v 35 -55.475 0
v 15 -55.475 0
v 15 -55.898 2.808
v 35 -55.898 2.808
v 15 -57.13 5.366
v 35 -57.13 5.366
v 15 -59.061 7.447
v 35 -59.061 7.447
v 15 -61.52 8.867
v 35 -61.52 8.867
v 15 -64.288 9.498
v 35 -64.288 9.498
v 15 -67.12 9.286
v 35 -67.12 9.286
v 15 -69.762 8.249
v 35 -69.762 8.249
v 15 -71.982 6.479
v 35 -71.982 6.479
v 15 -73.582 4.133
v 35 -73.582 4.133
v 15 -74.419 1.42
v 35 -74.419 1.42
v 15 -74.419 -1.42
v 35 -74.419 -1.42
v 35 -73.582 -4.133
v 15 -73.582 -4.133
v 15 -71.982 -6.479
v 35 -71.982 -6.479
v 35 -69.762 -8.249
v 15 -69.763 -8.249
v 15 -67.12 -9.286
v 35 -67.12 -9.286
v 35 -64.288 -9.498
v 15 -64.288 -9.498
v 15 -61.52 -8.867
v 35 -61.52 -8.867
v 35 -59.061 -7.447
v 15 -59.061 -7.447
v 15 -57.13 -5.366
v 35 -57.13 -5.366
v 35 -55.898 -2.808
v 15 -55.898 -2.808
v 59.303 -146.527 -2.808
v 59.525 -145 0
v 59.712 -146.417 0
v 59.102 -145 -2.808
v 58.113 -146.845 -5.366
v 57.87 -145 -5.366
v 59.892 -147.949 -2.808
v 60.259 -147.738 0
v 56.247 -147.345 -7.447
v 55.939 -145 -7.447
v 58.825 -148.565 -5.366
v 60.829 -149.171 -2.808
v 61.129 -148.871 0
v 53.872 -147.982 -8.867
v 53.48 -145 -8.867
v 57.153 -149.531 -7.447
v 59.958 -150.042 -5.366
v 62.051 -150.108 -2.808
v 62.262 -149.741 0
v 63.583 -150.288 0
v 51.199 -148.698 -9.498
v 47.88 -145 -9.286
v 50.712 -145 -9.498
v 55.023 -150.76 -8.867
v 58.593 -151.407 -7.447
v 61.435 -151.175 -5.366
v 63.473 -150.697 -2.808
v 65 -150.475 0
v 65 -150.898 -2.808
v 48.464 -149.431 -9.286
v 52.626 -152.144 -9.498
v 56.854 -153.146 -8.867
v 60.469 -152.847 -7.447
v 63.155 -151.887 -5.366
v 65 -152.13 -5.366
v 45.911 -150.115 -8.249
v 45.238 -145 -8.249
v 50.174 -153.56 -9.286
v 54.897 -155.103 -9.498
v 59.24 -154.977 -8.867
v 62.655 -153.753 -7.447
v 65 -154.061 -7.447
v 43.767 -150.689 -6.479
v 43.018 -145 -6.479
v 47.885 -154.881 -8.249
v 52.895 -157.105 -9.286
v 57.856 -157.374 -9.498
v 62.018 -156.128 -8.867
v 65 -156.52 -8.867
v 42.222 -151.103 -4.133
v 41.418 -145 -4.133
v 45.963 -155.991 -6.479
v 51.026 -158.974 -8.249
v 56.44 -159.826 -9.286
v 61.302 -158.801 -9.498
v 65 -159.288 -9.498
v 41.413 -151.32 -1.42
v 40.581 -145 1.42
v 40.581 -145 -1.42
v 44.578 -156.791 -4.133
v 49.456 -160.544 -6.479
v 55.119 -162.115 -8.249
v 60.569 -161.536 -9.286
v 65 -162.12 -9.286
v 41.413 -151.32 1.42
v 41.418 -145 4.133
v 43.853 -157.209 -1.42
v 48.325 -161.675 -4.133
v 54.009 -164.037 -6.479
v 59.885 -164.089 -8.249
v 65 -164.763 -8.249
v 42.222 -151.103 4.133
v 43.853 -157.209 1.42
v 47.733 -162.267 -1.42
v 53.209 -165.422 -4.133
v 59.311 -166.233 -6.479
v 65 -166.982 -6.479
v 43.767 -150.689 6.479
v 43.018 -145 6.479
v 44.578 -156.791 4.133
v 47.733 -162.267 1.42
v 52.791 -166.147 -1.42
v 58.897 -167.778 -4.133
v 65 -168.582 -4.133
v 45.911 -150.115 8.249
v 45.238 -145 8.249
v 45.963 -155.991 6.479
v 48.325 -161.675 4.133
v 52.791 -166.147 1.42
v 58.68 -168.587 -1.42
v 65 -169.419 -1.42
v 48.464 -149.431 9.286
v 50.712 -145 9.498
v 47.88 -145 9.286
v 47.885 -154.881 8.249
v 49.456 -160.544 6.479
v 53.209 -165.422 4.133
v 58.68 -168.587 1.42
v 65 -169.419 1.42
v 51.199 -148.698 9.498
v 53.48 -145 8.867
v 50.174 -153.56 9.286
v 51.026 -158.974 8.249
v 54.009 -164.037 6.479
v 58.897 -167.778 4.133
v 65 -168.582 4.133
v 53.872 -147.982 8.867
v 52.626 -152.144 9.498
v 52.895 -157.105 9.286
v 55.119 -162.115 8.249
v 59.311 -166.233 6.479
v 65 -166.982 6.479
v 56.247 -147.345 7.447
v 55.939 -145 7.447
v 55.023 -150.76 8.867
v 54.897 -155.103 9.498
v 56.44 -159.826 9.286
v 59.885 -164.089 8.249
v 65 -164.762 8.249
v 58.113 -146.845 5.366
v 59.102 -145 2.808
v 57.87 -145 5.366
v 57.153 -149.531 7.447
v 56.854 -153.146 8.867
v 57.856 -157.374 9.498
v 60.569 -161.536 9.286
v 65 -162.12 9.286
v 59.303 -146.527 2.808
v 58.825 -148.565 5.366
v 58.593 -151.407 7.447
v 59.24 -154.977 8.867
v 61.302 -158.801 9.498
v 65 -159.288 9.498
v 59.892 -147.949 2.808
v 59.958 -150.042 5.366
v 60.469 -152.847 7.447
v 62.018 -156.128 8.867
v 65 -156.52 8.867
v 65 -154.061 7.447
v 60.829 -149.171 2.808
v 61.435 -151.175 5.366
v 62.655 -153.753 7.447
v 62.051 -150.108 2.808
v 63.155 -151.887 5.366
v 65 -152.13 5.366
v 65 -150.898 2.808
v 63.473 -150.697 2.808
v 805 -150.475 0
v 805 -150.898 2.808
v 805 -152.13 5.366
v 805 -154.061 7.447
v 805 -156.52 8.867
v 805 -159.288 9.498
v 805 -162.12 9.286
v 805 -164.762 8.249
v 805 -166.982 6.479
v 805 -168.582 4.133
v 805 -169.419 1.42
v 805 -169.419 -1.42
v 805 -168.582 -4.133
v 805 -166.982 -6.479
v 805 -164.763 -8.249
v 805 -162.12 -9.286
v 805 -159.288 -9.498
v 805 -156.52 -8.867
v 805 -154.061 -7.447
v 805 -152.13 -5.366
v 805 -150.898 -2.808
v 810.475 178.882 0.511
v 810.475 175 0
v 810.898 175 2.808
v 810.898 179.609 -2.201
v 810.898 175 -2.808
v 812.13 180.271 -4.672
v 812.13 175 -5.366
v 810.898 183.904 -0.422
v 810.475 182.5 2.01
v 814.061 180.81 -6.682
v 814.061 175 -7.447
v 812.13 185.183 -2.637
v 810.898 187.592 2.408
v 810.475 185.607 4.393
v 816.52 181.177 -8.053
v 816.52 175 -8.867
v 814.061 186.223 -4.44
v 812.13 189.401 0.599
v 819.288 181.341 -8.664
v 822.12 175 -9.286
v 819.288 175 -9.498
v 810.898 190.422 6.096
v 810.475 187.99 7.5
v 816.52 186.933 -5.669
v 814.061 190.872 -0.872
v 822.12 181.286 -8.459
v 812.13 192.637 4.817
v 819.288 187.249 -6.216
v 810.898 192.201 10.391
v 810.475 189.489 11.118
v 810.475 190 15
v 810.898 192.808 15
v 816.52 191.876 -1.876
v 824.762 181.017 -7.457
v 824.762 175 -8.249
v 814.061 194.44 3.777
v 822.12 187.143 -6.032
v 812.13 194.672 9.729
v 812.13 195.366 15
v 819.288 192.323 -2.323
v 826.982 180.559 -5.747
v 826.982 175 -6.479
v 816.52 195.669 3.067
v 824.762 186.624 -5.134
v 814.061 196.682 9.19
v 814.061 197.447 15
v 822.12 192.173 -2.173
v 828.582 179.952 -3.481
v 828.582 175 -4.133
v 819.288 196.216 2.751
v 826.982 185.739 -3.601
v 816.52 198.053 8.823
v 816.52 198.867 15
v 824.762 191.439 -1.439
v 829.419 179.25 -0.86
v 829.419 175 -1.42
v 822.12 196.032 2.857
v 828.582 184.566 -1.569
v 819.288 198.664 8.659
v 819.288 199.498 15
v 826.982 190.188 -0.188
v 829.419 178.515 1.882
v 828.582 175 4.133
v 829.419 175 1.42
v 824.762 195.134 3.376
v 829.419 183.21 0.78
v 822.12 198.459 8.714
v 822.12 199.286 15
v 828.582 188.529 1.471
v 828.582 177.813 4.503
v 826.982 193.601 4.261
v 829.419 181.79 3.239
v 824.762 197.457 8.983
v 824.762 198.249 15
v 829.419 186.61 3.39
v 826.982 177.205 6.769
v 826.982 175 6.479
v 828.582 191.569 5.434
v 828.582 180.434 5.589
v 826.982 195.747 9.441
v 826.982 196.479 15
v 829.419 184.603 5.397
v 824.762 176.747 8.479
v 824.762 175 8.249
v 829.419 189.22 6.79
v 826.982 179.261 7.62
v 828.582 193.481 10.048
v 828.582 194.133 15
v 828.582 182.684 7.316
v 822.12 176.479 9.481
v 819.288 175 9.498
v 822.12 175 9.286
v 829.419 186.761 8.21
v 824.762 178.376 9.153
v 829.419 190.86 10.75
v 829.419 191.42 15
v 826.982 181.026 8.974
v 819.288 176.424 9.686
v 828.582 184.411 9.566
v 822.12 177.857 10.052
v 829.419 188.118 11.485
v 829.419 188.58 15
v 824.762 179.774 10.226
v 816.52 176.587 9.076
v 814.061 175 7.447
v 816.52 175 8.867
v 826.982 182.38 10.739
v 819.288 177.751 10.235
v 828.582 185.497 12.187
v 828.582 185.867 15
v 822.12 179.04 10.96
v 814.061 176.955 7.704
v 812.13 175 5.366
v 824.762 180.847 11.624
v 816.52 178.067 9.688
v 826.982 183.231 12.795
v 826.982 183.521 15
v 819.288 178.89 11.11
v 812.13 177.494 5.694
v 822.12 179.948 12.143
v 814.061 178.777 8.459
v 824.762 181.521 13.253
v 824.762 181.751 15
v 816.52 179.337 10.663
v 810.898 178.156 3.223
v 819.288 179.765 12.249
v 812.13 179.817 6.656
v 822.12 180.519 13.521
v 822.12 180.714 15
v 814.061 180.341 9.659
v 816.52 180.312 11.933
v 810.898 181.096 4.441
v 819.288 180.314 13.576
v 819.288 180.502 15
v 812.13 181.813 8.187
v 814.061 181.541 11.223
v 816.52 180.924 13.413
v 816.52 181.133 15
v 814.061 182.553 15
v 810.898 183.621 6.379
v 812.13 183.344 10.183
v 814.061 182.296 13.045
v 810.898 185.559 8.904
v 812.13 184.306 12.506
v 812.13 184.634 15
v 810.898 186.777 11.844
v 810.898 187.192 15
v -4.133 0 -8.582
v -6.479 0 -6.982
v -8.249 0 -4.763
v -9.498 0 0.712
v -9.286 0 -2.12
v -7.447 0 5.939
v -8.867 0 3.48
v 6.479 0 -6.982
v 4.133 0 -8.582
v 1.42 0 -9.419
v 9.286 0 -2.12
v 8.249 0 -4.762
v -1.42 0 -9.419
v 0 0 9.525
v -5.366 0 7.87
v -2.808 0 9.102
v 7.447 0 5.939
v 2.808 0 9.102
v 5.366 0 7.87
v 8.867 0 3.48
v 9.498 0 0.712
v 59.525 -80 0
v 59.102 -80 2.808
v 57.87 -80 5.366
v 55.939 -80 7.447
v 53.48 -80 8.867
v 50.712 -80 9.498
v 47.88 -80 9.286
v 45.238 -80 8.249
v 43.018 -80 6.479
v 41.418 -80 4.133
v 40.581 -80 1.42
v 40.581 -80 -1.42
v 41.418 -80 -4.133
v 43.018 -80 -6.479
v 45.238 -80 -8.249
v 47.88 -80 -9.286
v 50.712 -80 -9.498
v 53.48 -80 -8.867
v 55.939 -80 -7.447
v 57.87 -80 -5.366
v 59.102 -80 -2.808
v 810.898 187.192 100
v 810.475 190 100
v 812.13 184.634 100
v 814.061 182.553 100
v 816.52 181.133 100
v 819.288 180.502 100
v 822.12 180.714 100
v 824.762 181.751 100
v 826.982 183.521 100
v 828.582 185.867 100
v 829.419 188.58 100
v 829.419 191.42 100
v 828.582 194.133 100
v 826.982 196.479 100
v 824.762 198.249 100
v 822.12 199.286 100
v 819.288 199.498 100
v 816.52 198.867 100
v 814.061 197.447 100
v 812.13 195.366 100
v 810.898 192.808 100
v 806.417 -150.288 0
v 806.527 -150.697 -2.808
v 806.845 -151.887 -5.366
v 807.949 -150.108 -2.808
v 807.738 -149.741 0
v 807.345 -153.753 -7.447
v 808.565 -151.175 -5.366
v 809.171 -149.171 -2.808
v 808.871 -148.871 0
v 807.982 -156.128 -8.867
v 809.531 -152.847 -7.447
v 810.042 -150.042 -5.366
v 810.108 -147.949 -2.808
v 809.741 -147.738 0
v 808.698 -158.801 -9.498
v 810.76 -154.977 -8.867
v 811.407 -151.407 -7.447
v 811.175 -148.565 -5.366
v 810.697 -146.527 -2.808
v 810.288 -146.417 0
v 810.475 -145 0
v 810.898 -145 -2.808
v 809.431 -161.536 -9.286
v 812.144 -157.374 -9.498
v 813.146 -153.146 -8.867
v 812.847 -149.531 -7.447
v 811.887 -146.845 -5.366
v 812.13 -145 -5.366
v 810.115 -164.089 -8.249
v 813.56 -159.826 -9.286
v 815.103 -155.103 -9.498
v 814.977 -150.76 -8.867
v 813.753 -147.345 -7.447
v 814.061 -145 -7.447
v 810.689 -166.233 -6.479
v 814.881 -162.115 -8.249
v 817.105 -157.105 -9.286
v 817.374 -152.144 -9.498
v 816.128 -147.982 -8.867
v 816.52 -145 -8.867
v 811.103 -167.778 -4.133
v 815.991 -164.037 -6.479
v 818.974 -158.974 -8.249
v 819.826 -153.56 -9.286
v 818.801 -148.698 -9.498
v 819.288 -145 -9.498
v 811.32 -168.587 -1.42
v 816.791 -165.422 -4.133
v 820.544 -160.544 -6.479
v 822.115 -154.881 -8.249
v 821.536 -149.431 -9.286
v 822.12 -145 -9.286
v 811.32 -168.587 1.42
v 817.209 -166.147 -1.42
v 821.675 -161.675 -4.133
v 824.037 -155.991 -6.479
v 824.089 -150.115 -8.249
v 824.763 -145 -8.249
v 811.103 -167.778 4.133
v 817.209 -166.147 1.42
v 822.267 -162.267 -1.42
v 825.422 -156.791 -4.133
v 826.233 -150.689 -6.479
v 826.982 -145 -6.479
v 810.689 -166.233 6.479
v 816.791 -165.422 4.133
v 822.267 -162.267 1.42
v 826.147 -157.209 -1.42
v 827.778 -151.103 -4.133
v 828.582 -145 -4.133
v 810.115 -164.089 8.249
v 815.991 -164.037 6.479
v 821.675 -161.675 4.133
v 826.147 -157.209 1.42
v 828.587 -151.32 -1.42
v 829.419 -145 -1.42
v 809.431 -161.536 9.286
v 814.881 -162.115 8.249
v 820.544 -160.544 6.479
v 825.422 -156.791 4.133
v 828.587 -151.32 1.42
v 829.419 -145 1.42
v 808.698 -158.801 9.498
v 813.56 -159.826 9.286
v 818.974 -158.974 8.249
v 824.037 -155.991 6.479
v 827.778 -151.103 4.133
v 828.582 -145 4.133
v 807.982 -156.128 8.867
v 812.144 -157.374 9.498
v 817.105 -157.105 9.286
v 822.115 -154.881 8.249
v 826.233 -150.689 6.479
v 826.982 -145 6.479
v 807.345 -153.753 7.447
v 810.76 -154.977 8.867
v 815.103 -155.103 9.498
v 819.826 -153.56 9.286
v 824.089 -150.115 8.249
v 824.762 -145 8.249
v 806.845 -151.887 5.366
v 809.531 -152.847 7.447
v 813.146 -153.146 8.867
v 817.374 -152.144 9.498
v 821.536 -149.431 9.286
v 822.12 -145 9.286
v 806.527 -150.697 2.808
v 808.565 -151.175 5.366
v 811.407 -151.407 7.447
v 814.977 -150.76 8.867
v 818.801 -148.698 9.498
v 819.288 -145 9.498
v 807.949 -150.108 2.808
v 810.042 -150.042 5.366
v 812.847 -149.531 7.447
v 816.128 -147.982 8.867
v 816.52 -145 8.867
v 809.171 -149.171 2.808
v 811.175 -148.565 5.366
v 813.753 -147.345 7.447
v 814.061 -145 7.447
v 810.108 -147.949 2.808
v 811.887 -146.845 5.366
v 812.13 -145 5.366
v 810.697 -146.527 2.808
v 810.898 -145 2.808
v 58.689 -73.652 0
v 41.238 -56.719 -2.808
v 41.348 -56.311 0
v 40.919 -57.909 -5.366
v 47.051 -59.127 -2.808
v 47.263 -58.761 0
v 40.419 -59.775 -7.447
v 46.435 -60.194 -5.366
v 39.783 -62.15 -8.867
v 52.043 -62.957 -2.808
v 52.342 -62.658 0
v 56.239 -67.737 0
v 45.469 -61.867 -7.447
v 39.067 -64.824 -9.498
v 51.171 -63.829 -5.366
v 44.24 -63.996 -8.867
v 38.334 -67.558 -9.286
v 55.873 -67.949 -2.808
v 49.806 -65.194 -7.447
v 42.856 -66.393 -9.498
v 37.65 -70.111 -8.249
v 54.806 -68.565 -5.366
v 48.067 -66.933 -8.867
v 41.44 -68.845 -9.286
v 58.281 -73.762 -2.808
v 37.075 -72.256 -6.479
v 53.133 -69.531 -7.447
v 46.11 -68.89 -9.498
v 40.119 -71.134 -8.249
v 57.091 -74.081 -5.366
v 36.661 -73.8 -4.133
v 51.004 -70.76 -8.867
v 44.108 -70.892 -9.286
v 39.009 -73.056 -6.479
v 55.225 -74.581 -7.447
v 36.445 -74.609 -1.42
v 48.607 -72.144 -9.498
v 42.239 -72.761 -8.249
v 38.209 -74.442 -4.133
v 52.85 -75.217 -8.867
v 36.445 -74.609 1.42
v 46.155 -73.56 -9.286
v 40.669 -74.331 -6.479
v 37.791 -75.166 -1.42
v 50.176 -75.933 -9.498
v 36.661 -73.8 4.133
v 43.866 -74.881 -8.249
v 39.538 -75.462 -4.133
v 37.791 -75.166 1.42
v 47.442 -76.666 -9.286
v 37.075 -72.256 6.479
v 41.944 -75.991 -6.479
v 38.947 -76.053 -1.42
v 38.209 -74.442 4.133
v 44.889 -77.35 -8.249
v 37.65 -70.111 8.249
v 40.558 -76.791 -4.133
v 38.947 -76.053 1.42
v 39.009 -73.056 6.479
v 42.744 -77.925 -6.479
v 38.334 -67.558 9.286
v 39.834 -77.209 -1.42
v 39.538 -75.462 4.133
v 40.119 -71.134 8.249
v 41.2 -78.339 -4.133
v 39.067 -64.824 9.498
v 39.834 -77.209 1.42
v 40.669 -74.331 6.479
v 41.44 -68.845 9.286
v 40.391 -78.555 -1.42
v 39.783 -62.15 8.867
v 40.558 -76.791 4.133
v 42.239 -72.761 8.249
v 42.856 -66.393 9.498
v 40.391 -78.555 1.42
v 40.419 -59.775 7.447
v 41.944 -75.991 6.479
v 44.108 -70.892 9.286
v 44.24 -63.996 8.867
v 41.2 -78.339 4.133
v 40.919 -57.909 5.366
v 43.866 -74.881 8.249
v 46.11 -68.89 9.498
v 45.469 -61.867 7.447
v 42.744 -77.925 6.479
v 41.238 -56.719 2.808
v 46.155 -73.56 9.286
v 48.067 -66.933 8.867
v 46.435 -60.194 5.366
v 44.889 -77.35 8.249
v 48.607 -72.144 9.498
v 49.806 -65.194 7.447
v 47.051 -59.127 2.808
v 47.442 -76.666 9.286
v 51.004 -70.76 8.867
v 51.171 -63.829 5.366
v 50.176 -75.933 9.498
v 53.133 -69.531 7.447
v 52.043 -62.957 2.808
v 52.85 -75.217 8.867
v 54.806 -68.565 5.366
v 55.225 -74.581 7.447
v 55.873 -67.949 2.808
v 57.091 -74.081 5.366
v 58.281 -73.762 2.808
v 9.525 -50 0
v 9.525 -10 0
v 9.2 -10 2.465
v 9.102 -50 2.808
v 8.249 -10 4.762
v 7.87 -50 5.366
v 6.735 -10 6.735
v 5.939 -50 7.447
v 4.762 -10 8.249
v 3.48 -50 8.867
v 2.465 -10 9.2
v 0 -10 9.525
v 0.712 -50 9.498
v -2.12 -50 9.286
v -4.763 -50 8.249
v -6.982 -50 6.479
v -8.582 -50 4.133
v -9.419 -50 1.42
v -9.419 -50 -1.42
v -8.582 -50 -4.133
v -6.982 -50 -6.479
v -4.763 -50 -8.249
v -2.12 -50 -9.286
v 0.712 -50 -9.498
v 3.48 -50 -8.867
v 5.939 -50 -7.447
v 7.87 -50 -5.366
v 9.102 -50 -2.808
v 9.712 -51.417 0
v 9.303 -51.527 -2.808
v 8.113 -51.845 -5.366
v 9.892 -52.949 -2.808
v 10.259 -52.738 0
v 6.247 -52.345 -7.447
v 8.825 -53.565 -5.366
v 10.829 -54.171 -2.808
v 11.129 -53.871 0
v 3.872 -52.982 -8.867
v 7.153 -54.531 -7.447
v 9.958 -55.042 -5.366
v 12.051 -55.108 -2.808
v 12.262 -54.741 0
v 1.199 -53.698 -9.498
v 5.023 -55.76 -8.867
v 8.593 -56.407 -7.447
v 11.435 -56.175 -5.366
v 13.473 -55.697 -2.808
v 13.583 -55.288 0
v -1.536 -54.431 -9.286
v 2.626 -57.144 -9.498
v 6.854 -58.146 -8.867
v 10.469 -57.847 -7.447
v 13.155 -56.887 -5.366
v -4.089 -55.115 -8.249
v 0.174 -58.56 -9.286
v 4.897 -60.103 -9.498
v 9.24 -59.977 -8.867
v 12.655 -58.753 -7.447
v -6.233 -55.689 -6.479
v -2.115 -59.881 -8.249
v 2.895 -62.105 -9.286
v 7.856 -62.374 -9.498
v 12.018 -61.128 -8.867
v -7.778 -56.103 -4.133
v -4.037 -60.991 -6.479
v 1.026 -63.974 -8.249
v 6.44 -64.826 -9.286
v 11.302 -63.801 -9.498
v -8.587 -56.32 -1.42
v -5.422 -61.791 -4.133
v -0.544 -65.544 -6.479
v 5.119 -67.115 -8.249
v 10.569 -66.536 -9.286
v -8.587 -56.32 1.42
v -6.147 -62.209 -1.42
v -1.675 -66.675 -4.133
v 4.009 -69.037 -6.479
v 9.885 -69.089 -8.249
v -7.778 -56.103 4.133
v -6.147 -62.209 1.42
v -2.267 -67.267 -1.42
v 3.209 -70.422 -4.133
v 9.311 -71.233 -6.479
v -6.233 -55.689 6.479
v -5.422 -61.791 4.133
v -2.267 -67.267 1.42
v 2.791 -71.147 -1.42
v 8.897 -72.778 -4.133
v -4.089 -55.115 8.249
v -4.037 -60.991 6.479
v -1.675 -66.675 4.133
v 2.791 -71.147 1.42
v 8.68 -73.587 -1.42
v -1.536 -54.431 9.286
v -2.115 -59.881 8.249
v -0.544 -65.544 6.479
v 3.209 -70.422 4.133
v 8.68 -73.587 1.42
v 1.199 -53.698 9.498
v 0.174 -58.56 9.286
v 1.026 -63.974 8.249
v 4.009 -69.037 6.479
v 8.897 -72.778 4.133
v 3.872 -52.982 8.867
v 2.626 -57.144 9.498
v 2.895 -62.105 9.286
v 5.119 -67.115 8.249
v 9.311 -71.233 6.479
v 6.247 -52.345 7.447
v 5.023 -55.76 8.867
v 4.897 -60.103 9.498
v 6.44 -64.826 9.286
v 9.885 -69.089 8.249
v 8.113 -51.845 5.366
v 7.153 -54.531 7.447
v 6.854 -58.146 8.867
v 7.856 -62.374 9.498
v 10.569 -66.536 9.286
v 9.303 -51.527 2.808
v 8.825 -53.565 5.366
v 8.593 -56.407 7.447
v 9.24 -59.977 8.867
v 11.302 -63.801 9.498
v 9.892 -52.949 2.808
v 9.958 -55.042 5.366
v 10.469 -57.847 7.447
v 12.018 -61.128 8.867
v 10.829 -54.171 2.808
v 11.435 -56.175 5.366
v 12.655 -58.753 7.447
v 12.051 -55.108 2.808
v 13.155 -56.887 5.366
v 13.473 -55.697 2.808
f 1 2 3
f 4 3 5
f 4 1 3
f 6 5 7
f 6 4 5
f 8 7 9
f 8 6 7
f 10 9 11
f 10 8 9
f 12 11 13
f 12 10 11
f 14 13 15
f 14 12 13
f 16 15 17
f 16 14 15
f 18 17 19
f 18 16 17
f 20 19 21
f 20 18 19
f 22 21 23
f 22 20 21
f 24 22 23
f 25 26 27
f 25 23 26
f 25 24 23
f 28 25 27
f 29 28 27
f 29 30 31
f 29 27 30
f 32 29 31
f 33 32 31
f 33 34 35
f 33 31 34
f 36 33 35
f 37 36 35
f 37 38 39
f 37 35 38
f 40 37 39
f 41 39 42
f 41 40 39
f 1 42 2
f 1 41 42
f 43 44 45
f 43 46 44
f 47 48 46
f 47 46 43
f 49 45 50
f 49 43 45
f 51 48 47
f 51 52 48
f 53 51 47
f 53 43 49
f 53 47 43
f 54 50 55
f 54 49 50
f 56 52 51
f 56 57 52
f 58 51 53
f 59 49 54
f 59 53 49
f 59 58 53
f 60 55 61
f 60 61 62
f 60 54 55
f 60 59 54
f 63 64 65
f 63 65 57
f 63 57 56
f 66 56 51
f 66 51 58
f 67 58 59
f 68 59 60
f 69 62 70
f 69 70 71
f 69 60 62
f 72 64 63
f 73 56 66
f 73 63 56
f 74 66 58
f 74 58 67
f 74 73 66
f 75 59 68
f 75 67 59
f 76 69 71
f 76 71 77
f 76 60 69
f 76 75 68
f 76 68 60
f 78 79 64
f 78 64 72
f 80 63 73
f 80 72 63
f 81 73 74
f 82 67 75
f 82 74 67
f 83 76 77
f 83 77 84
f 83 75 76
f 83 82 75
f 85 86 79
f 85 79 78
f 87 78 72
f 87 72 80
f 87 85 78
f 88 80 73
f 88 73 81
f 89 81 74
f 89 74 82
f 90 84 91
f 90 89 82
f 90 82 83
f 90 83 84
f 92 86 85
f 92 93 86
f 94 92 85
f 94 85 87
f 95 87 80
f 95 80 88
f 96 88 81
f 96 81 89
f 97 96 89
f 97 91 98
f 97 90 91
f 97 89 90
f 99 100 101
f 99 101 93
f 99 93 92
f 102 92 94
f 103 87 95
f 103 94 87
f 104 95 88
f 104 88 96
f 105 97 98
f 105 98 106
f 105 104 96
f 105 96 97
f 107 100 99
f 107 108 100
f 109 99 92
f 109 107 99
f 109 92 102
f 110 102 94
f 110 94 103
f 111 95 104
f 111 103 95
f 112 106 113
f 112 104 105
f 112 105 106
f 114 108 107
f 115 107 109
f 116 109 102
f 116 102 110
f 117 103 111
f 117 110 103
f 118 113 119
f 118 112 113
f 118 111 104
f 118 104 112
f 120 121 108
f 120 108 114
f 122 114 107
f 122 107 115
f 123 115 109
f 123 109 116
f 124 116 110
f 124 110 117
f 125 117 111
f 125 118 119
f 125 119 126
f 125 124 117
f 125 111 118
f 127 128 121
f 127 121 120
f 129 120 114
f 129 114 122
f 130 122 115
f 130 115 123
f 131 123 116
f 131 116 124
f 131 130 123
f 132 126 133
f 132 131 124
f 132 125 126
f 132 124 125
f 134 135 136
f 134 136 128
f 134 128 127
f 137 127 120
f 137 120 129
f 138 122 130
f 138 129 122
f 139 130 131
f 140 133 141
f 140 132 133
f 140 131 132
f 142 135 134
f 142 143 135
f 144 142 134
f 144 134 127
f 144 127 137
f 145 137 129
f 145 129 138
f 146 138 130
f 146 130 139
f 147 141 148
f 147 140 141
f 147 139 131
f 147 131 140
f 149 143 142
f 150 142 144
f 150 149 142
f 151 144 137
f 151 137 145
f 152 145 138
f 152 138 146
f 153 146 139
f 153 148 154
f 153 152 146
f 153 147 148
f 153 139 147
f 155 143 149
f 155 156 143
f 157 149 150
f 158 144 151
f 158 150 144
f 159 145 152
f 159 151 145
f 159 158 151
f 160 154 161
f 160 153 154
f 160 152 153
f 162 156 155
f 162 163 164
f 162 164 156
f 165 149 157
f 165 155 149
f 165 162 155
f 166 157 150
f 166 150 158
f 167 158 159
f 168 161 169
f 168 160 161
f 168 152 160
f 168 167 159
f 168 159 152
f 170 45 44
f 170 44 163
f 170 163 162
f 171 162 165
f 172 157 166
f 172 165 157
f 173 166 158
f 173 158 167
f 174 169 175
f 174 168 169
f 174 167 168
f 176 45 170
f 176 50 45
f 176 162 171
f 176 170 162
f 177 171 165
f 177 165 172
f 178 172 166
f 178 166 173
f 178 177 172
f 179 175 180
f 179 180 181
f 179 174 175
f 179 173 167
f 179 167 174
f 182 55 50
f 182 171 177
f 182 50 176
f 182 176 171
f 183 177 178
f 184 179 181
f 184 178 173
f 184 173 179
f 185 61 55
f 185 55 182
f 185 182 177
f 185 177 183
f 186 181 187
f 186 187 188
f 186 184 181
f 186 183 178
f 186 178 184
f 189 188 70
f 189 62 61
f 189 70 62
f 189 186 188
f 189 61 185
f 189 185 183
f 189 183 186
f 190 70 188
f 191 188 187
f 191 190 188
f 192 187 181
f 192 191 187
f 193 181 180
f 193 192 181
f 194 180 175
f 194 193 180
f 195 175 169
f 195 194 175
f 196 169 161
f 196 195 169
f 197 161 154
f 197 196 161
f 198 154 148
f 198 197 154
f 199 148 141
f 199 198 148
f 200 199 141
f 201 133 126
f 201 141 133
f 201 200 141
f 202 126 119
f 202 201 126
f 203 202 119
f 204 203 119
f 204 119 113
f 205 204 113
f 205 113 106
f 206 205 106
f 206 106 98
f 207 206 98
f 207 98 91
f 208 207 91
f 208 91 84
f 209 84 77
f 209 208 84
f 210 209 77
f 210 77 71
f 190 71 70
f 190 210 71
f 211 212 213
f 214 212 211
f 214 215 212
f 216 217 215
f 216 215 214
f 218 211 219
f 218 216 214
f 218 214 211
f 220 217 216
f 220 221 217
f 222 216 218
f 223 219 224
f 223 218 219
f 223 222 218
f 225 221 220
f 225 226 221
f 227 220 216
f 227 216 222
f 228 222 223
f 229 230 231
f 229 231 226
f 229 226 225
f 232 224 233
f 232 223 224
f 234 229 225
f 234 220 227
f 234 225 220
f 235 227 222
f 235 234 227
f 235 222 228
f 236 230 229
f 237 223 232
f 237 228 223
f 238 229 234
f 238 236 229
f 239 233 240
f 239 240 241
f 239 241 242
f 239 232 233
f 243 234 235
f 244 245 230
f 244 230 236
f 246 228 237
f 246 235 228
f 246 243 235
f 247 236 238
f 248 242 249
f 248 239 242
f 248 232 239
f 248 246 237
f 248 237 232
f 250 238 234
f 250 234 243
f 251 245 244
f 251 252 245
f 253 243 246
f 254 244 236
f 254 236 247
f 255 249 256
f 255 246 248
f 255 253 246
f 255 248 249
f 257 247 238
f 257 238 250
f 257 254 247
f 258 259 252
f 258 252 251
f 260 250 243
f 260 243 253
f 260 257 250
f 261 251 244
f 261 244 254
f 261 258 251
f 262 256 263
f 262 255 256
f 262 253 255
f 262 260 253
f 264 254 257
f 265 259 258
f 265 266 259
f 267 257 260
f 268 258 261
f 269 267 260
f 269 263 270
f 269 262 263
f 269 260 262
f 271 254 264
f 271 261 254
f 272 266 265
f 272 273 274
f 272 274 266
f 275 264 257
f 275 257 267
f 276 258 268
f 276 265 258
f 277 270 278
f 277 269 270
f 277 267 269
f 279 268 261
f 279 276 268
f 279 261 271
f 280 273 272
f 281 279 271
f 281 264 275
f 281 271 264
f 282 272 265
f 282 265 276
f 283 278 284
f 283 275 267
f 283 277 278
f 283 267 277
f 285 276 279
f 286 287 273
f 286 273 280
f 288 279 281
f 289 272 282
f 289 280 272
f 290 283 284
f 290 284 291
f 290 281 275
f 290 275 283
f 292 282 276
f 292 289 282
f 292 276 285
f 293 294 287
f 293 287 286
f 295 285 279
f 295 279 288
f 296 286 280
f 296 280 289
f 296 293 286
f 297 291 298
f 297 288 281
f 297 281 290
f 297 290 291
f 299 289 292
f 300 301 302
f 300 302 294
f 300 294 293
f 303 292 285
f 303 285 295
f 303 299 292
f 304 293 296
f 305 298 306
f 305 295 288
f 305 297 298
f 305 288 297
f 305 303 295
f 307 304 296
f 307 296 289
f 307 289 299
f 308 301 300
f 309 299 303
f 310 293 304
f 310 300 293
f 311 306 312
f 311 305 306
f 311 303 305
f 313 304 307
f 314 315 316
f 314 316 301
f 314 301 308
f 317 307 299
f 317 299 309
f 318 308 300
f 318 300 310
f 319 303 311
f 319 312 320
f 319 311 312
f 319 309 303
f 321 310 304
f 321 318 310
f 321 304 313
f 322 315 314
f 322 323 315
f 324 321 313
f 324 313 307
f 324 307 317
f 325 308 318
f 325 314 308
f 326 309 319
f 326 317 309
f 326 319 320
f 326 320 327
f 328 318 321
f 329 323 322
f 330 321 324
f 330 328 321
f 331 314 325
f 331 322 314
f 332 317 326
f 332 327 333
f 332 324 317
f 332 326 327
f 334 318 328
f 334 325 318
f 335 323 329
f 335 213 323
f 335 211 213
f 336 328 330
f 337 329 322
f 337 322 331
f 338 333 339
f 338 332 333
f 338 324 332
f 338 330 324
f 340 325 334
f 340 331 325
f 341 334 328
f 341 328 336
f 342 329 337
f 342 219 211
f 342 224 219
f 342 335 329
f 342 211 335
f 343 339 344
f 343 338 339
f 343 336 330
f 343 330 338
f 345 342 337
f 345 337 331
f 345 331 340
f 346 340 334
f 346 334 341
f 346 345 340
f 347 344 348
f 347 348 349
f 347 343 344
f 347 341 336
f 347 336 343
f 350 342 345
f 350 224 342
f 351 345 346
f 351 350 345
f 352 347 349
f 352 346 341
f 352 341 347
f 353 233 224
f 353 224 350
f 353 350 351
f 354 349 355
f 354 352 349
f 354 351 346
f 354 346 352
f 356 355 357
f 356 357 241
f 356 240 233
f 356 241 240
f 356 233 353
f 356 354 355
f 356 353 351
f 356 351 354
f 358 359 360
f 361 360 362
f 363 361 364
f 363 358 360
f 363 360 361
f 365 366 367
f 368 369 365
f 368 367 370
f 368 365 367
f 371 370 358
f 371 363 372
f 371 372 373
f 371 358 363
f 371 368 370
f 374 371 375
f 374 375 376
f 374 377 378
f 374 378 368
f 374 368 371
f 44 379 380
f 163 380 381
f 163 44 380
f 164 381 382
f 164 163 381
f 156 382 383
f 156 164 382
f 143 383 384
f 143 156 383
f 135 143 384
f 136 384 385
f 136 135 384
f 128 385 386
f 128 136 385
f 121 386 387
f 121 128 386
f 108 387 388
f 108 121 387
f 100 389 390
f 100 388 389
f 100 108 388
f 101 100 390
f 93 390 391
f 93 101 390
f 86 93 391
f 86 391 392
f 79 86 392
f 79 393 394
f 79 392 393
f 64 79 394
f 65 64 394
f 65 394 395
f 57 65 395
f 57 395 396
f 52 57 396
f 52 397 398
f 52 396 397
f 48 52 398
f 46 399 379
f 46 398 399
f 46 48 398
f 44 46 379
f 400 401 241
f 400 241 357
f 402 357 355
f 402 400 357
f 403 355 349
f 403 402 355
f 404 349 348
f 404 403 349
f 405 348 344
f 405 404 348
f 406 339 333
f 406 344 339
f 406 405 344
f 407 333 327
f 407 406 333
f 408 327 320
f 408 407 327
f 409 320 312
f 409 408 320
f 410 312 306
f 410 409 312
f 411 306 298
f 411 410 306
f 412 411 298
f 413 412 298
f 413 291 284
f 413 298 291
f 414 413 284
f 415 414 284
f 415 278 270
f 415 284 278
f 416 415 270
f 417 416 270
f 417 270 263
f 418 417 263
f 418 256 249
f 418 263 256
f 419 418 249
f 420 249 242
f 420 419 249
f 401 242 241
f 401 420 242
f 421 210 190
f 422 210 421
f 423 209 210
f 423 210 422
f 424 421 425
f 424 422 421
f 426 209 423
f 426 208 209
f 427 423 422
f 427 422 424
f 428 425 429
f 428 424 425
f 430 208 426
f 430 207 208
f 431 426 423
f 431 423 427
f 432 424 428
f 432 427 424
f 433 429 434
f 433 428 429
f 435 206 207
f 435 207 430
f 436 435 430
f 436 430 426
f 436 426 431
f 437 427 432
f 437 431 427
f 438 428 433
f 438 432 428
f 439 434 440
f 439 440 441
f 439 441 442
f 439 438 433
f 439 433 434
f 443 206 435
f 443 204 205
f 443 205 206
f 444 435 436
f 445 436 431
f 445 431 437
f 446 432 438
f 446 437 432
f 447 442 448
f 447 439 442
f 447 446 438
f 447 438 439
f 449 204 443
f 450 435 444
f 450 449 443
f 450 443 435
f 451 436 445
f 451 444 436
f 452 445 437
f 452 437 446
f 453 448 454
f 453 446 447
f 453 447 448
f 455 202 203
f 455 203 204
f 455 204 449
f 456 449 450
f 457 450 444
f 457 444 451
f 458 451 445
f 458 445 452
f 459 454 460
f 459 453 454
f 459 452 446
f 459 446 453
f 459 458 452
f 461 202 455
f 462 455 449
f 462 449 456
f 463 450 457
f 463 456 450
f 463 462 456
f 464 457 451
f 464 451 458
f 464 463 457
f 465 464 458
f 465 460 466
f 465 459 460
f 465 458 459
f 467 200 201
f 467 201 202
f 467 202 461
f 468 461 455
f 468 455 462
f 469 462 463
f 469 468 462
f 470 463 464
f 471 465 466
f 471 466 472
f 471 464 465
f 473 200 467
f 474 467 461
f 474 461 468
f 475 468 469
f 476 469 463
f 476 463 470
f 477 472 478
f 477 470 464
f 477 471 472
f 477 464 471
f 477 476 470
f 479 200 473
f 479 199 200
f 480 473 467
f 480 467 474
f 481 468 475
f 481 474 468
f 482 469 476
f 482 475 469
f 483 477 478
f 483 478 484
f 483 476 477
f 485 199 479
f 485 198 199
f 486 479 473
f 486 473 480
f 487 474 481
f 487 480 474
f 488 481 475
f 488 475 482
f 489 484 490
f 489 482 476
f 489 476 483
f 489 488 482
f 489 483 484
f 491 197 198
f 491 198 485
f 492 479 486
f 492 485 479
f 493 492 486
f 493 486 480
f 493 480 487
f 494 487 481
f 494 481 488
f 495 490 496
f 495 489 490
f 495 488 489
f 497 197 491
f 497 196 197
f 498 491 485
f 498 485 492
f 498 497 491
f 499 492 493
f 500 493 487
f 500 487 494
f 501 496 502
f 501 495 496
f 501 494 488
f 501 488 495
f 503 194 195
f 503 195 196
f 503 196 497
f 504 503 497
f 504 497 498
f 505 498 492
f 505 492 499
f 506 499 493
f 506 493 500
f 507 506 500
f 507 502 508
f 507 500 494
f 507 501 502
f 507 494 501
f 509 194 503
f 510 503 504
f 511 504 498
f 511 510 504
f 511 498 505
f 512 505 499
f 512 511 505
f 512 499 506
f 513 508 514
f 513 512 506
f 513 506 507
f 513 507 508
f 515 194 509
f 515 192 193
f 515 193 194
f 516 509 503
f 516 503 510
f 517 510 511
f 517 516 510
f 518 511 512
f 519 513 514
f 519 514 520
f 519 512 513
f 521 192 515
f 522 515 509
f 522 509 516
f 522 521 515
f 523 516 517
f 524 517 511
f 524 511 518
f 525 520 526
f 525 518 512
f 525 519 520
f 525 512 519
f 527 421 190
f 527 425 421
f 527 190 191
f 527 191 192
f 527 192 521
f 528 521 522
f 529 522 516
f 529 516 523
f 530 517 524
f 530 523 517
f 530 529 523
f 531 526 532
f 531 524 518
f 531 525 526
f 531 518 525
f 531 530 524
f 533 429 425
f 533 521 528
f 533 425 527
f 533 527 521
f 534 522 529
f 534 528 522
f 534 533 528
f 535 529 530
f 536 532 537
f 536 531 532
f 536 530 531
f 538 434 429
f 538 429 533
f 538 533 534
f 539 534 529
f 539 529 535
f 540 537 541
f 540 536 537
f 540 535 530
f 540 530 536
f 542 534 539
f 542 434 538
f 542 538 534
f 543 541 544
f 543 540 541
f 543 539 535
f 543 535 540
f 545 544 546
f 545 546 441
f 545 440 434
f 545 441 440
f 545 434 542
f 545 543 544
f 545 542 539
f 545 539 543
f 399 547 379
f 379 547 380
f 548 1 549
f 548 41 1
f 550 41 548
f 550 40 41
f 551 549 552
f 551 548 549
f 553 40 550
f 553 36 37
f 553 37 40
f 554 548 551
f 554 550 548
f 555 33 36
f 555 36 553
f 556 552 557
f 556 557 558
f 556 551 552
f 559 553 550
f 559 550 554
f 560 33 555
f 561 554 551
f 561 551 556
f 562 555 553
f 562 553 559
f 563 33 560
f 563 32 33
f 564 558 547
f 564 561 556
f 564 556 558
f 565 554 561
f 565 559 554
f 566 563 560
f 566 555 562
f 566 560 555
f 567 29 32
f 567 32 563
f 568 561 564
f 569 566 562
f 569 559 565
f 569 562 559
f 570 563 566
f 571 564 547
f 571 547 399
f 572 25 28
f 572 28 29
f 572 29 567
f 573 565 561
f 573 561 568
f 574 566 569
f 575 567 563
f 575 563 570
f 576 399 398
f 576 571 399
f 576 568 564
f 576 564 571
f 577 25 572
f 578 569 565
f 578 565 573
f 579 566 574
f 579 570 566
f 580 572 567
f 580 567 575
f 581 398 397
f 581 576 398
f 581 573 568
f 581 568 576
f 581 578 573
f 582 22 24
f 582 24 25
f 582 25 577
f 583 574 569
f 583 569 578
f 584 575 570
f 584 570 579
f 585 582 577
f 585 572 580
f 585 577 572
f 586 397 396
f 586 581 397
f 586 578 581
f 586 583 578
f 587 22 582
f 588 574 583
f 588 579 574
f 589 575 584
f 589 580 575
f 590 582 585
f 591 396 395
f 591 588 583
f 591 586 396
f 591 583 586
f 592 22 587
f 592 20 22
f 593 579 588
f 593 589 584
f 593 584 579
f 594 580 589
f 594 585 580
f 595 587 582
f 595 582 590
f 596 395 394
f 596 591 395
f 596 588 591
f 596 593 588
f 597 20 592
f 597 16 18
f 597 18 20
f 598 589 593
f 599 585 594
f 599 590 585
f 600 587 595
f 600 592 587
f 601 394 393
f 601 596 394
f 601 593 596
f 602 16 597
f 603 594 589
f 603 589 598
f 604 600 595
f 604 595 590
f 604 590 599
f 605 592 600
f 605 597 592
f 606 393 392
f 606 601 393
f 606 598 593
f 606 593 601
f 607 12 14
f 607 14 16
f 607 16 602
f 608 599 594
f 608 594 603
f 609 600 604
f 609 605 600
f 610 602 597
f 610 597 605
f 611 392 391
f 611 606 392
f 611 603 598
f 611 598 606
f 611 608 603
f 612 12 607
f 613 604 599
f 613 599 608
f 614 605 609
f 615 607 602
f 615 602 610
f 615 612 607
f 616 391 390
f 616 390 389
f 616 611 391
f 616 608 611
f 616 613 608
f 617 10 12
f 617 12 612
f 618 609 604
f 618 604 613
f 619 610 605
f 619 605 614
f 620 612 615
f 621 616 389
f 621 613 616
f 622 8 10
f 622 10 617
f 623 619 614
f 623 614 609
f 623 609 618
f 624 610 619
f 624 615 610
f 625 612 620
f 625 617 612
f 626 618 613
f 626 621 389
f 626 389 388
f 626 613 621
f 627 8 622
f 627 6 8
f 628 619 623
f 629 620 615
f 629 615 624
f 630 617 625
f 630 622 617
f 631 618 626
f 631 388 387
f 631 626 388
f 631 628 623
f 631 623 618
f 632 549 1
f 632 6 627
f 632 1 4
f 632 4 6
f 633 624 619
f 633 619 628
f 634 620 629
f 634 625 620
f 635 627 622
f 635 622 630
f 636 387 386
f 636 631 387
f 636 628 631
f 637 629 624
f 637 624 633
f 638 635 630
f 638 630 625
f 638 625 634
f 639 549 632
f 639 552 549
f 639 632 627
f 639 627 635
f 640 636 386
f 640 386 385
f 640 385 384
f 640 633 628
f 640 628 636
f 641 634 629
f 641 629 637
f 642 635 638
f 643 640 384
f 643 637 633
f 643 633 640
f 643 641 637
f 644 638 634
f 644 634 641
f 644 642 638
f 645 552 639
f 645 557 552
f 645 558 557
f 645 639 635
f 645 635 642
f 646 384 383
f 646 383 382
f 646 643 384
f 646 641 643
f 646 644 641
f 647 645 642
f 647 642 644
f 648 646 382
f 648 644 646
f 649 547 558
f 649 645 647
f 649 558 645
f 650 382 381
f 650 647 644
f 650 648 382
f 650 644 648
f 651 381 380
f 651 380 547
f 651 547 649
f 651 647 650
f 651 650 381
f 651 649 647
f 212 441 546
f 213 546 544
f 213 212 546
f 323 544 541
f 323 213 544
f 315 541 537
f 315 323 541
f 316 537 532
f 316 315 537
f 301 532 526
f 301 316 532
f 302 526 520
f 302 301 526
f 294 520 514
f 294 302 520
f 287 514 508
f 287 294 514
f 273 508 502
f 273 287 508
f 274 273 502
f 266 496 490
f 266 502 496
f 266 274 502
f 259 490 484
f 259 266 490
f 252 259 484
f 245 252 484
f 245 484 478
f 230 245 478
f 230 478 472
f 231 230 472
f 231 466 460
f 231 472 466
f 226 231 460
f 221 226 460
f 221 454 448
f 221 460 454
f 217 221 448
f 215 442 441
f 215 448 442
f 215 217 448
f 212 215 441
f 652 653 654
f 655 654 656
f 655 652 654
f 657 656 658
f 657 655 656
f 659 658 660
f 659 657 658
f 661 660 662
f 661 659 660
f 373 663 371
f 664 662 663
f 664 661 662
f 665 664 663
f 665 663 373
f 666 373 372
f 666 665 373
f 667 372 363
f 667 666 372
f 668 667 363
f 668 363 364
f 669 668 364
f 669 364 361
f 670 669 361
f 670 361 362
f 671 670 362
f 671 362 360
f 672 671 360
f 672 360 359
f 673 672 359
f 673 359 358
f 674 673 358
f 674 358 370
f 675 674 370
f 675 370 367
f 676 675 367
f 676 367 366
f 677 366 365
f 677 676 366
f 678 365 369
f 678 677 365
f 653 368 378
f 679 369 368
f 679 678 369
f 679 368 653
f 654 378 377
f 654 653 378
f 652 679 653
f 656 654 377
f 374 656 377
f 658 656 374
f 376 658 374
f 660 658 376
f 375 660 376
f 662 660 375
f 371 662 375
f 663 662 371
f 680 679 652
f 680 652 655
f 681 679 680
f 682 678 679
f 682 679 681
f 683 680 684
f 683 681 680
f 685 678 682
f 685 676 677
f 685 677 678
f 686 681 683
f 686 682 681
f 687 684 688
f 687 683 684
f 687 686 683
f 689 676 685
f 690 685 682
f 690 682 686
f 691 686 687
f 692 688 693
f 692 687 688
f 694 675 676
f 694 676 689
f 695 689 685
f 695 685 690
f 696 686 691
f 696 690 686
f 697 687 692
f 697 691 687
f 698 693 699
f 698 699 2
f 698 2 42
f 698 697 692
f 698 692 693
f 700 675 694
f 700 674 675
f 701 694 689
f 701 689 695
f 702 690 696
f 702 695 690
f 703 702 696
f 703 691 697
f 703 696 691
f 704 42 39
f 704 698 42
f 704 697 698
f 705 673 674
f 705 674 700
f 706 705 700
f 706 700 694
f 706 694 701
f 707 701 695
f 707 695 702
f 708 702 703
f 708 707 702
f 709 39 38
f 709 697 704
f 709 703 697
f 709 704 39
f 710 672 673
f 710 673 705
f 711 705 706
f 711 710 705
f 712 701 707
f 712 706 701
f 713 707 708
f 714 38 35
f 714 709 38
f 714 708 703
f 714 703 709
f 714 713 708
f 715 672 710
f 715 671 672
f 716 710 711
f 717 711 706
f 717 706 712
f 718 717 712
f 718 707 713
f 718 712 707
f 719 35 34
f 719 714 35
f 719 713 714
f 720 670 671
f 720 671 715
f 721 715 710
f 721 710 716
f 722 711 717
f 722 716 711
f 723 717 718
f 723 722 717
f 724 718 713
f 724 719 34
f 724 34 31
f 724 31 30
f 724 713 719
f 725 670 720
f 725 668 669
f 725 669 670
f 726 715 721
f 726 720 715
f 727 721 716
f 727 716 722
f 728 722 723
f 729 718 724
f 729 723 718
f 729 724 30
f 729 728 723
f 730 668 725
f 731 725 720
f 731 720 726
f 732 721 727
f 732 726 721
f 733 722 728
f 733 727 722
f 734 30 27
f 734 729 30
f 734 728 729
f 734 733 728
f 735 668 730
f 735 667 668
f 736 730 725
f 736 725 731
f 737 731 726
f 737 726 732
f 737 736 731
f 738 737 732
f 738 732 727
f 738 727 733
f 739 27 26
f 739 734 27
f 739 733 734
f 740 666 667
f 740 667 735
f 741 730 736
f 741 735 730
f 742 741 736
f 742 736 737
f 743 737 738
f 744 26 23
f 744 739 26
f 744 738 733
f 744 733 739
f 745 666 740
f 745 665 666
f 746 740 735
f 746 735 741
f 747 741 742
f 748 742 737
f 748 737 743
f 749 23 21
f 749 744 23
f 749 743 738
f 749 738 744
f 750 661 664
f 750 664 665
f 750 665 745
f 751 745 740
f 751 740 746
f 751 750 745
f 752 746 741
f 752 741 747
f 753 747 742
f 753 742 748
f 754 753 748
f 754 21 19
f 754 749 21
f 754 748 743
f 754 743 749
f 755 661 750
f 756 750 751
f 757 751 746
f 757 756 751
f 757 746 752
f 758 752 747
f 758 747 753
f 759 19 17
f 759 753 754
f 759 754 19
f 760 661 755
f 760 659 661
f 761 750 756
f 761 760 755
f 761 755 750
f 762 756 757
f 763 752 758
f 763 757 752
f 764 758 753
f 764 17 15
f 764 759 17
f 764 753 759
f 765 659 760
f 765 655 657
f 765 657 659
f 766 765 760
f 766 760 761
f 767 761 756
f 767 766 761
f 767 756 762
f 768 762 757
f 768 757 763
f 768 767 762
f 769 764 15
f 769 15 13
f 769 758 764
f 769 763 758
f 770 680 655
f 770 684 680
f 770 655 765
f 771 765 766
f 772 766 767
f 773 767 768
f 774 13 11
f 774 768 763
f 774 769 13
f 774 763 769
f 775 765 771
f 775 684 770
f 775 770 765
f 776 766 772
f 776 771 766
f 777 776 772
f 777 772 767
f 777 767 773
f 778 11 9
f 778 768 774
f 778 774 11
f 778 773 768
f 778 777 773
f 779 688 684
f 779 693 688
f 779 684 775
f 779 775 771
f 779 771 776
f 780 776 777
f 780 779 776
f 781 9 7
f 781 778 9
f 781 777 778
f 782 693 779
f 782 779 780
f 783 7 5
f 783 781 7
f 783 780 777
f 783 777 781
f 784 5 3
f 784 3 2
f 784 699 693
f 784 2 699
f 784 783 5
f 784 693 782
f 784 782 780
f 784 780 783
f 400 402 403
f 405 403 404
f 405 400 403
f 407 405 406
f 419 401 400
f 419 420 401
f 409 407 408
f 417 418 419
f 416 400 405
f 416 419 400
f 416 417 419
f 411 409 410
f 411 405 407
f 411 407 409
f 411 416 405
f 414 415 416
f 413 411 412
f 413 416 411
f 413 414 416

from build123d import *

# Parameters (mm, degrees)
CROQUIS1_R              = 9.525
SALIENTE_EXTRUIR1_DEPTH = 10
CROQUIS2_R              = 9.525


with BuildPart() as part:
    # Croquis1 → Saliente-Extruir1 (new body)
    with BuildSketch(Plane(origin=(0, 0, 0), x_dir=(1, 0, 0), z_dir=(0, 1, 0))):
        with Locations(Location((0, 0, 0), (0, 0, 270))):
            Circle(CROQUIS1_R)
    extrude(amount=-SALIENTE_EXTRUIR1_DEPTH)

    # Barrer1: sweep along a curve in space
    with BuildLine() as barrer1_path:
        Line((0, -10, 0), (0, -50, 0))
        ThreePointArc((0, -50, 0), (4.393398282, -60.606601718, 0), (15, -65, 0))
        Line((15, -65, 0), (35, -65, 0))
        ThreePointArc((35, -65, 0), (45.606601718, -69.393398282, 0), (50, -80, 0))
        Line((50, -80, 0), (50, -145, 0))
        ThreePointArc((50, -145, 0), (54.393398282, -155.606601718, 0), (65, -160, 0))
        Line((65, -160, 0), (805, -160, 0))
        ThreePointArc((805, -160, 0), (815.606601718, -155.606601718, 0), (820, -145, 0))
        Line((820, -145, 0), (820, 175, 0))
        ThreePointArc((820, 175, 0), (820, 185.606601718, 4.393398282), (820, 190, 15))
        Line((820, 190, 15), (820, 190, 100))
    # Croquis2 → Barrer1 (sweep)
    with BuildSketch(Plane.XZ.offset(10)):
        Circle(CROQUIS2_R)
    sweep(path=barrer1_path.line)


solid = part.part
